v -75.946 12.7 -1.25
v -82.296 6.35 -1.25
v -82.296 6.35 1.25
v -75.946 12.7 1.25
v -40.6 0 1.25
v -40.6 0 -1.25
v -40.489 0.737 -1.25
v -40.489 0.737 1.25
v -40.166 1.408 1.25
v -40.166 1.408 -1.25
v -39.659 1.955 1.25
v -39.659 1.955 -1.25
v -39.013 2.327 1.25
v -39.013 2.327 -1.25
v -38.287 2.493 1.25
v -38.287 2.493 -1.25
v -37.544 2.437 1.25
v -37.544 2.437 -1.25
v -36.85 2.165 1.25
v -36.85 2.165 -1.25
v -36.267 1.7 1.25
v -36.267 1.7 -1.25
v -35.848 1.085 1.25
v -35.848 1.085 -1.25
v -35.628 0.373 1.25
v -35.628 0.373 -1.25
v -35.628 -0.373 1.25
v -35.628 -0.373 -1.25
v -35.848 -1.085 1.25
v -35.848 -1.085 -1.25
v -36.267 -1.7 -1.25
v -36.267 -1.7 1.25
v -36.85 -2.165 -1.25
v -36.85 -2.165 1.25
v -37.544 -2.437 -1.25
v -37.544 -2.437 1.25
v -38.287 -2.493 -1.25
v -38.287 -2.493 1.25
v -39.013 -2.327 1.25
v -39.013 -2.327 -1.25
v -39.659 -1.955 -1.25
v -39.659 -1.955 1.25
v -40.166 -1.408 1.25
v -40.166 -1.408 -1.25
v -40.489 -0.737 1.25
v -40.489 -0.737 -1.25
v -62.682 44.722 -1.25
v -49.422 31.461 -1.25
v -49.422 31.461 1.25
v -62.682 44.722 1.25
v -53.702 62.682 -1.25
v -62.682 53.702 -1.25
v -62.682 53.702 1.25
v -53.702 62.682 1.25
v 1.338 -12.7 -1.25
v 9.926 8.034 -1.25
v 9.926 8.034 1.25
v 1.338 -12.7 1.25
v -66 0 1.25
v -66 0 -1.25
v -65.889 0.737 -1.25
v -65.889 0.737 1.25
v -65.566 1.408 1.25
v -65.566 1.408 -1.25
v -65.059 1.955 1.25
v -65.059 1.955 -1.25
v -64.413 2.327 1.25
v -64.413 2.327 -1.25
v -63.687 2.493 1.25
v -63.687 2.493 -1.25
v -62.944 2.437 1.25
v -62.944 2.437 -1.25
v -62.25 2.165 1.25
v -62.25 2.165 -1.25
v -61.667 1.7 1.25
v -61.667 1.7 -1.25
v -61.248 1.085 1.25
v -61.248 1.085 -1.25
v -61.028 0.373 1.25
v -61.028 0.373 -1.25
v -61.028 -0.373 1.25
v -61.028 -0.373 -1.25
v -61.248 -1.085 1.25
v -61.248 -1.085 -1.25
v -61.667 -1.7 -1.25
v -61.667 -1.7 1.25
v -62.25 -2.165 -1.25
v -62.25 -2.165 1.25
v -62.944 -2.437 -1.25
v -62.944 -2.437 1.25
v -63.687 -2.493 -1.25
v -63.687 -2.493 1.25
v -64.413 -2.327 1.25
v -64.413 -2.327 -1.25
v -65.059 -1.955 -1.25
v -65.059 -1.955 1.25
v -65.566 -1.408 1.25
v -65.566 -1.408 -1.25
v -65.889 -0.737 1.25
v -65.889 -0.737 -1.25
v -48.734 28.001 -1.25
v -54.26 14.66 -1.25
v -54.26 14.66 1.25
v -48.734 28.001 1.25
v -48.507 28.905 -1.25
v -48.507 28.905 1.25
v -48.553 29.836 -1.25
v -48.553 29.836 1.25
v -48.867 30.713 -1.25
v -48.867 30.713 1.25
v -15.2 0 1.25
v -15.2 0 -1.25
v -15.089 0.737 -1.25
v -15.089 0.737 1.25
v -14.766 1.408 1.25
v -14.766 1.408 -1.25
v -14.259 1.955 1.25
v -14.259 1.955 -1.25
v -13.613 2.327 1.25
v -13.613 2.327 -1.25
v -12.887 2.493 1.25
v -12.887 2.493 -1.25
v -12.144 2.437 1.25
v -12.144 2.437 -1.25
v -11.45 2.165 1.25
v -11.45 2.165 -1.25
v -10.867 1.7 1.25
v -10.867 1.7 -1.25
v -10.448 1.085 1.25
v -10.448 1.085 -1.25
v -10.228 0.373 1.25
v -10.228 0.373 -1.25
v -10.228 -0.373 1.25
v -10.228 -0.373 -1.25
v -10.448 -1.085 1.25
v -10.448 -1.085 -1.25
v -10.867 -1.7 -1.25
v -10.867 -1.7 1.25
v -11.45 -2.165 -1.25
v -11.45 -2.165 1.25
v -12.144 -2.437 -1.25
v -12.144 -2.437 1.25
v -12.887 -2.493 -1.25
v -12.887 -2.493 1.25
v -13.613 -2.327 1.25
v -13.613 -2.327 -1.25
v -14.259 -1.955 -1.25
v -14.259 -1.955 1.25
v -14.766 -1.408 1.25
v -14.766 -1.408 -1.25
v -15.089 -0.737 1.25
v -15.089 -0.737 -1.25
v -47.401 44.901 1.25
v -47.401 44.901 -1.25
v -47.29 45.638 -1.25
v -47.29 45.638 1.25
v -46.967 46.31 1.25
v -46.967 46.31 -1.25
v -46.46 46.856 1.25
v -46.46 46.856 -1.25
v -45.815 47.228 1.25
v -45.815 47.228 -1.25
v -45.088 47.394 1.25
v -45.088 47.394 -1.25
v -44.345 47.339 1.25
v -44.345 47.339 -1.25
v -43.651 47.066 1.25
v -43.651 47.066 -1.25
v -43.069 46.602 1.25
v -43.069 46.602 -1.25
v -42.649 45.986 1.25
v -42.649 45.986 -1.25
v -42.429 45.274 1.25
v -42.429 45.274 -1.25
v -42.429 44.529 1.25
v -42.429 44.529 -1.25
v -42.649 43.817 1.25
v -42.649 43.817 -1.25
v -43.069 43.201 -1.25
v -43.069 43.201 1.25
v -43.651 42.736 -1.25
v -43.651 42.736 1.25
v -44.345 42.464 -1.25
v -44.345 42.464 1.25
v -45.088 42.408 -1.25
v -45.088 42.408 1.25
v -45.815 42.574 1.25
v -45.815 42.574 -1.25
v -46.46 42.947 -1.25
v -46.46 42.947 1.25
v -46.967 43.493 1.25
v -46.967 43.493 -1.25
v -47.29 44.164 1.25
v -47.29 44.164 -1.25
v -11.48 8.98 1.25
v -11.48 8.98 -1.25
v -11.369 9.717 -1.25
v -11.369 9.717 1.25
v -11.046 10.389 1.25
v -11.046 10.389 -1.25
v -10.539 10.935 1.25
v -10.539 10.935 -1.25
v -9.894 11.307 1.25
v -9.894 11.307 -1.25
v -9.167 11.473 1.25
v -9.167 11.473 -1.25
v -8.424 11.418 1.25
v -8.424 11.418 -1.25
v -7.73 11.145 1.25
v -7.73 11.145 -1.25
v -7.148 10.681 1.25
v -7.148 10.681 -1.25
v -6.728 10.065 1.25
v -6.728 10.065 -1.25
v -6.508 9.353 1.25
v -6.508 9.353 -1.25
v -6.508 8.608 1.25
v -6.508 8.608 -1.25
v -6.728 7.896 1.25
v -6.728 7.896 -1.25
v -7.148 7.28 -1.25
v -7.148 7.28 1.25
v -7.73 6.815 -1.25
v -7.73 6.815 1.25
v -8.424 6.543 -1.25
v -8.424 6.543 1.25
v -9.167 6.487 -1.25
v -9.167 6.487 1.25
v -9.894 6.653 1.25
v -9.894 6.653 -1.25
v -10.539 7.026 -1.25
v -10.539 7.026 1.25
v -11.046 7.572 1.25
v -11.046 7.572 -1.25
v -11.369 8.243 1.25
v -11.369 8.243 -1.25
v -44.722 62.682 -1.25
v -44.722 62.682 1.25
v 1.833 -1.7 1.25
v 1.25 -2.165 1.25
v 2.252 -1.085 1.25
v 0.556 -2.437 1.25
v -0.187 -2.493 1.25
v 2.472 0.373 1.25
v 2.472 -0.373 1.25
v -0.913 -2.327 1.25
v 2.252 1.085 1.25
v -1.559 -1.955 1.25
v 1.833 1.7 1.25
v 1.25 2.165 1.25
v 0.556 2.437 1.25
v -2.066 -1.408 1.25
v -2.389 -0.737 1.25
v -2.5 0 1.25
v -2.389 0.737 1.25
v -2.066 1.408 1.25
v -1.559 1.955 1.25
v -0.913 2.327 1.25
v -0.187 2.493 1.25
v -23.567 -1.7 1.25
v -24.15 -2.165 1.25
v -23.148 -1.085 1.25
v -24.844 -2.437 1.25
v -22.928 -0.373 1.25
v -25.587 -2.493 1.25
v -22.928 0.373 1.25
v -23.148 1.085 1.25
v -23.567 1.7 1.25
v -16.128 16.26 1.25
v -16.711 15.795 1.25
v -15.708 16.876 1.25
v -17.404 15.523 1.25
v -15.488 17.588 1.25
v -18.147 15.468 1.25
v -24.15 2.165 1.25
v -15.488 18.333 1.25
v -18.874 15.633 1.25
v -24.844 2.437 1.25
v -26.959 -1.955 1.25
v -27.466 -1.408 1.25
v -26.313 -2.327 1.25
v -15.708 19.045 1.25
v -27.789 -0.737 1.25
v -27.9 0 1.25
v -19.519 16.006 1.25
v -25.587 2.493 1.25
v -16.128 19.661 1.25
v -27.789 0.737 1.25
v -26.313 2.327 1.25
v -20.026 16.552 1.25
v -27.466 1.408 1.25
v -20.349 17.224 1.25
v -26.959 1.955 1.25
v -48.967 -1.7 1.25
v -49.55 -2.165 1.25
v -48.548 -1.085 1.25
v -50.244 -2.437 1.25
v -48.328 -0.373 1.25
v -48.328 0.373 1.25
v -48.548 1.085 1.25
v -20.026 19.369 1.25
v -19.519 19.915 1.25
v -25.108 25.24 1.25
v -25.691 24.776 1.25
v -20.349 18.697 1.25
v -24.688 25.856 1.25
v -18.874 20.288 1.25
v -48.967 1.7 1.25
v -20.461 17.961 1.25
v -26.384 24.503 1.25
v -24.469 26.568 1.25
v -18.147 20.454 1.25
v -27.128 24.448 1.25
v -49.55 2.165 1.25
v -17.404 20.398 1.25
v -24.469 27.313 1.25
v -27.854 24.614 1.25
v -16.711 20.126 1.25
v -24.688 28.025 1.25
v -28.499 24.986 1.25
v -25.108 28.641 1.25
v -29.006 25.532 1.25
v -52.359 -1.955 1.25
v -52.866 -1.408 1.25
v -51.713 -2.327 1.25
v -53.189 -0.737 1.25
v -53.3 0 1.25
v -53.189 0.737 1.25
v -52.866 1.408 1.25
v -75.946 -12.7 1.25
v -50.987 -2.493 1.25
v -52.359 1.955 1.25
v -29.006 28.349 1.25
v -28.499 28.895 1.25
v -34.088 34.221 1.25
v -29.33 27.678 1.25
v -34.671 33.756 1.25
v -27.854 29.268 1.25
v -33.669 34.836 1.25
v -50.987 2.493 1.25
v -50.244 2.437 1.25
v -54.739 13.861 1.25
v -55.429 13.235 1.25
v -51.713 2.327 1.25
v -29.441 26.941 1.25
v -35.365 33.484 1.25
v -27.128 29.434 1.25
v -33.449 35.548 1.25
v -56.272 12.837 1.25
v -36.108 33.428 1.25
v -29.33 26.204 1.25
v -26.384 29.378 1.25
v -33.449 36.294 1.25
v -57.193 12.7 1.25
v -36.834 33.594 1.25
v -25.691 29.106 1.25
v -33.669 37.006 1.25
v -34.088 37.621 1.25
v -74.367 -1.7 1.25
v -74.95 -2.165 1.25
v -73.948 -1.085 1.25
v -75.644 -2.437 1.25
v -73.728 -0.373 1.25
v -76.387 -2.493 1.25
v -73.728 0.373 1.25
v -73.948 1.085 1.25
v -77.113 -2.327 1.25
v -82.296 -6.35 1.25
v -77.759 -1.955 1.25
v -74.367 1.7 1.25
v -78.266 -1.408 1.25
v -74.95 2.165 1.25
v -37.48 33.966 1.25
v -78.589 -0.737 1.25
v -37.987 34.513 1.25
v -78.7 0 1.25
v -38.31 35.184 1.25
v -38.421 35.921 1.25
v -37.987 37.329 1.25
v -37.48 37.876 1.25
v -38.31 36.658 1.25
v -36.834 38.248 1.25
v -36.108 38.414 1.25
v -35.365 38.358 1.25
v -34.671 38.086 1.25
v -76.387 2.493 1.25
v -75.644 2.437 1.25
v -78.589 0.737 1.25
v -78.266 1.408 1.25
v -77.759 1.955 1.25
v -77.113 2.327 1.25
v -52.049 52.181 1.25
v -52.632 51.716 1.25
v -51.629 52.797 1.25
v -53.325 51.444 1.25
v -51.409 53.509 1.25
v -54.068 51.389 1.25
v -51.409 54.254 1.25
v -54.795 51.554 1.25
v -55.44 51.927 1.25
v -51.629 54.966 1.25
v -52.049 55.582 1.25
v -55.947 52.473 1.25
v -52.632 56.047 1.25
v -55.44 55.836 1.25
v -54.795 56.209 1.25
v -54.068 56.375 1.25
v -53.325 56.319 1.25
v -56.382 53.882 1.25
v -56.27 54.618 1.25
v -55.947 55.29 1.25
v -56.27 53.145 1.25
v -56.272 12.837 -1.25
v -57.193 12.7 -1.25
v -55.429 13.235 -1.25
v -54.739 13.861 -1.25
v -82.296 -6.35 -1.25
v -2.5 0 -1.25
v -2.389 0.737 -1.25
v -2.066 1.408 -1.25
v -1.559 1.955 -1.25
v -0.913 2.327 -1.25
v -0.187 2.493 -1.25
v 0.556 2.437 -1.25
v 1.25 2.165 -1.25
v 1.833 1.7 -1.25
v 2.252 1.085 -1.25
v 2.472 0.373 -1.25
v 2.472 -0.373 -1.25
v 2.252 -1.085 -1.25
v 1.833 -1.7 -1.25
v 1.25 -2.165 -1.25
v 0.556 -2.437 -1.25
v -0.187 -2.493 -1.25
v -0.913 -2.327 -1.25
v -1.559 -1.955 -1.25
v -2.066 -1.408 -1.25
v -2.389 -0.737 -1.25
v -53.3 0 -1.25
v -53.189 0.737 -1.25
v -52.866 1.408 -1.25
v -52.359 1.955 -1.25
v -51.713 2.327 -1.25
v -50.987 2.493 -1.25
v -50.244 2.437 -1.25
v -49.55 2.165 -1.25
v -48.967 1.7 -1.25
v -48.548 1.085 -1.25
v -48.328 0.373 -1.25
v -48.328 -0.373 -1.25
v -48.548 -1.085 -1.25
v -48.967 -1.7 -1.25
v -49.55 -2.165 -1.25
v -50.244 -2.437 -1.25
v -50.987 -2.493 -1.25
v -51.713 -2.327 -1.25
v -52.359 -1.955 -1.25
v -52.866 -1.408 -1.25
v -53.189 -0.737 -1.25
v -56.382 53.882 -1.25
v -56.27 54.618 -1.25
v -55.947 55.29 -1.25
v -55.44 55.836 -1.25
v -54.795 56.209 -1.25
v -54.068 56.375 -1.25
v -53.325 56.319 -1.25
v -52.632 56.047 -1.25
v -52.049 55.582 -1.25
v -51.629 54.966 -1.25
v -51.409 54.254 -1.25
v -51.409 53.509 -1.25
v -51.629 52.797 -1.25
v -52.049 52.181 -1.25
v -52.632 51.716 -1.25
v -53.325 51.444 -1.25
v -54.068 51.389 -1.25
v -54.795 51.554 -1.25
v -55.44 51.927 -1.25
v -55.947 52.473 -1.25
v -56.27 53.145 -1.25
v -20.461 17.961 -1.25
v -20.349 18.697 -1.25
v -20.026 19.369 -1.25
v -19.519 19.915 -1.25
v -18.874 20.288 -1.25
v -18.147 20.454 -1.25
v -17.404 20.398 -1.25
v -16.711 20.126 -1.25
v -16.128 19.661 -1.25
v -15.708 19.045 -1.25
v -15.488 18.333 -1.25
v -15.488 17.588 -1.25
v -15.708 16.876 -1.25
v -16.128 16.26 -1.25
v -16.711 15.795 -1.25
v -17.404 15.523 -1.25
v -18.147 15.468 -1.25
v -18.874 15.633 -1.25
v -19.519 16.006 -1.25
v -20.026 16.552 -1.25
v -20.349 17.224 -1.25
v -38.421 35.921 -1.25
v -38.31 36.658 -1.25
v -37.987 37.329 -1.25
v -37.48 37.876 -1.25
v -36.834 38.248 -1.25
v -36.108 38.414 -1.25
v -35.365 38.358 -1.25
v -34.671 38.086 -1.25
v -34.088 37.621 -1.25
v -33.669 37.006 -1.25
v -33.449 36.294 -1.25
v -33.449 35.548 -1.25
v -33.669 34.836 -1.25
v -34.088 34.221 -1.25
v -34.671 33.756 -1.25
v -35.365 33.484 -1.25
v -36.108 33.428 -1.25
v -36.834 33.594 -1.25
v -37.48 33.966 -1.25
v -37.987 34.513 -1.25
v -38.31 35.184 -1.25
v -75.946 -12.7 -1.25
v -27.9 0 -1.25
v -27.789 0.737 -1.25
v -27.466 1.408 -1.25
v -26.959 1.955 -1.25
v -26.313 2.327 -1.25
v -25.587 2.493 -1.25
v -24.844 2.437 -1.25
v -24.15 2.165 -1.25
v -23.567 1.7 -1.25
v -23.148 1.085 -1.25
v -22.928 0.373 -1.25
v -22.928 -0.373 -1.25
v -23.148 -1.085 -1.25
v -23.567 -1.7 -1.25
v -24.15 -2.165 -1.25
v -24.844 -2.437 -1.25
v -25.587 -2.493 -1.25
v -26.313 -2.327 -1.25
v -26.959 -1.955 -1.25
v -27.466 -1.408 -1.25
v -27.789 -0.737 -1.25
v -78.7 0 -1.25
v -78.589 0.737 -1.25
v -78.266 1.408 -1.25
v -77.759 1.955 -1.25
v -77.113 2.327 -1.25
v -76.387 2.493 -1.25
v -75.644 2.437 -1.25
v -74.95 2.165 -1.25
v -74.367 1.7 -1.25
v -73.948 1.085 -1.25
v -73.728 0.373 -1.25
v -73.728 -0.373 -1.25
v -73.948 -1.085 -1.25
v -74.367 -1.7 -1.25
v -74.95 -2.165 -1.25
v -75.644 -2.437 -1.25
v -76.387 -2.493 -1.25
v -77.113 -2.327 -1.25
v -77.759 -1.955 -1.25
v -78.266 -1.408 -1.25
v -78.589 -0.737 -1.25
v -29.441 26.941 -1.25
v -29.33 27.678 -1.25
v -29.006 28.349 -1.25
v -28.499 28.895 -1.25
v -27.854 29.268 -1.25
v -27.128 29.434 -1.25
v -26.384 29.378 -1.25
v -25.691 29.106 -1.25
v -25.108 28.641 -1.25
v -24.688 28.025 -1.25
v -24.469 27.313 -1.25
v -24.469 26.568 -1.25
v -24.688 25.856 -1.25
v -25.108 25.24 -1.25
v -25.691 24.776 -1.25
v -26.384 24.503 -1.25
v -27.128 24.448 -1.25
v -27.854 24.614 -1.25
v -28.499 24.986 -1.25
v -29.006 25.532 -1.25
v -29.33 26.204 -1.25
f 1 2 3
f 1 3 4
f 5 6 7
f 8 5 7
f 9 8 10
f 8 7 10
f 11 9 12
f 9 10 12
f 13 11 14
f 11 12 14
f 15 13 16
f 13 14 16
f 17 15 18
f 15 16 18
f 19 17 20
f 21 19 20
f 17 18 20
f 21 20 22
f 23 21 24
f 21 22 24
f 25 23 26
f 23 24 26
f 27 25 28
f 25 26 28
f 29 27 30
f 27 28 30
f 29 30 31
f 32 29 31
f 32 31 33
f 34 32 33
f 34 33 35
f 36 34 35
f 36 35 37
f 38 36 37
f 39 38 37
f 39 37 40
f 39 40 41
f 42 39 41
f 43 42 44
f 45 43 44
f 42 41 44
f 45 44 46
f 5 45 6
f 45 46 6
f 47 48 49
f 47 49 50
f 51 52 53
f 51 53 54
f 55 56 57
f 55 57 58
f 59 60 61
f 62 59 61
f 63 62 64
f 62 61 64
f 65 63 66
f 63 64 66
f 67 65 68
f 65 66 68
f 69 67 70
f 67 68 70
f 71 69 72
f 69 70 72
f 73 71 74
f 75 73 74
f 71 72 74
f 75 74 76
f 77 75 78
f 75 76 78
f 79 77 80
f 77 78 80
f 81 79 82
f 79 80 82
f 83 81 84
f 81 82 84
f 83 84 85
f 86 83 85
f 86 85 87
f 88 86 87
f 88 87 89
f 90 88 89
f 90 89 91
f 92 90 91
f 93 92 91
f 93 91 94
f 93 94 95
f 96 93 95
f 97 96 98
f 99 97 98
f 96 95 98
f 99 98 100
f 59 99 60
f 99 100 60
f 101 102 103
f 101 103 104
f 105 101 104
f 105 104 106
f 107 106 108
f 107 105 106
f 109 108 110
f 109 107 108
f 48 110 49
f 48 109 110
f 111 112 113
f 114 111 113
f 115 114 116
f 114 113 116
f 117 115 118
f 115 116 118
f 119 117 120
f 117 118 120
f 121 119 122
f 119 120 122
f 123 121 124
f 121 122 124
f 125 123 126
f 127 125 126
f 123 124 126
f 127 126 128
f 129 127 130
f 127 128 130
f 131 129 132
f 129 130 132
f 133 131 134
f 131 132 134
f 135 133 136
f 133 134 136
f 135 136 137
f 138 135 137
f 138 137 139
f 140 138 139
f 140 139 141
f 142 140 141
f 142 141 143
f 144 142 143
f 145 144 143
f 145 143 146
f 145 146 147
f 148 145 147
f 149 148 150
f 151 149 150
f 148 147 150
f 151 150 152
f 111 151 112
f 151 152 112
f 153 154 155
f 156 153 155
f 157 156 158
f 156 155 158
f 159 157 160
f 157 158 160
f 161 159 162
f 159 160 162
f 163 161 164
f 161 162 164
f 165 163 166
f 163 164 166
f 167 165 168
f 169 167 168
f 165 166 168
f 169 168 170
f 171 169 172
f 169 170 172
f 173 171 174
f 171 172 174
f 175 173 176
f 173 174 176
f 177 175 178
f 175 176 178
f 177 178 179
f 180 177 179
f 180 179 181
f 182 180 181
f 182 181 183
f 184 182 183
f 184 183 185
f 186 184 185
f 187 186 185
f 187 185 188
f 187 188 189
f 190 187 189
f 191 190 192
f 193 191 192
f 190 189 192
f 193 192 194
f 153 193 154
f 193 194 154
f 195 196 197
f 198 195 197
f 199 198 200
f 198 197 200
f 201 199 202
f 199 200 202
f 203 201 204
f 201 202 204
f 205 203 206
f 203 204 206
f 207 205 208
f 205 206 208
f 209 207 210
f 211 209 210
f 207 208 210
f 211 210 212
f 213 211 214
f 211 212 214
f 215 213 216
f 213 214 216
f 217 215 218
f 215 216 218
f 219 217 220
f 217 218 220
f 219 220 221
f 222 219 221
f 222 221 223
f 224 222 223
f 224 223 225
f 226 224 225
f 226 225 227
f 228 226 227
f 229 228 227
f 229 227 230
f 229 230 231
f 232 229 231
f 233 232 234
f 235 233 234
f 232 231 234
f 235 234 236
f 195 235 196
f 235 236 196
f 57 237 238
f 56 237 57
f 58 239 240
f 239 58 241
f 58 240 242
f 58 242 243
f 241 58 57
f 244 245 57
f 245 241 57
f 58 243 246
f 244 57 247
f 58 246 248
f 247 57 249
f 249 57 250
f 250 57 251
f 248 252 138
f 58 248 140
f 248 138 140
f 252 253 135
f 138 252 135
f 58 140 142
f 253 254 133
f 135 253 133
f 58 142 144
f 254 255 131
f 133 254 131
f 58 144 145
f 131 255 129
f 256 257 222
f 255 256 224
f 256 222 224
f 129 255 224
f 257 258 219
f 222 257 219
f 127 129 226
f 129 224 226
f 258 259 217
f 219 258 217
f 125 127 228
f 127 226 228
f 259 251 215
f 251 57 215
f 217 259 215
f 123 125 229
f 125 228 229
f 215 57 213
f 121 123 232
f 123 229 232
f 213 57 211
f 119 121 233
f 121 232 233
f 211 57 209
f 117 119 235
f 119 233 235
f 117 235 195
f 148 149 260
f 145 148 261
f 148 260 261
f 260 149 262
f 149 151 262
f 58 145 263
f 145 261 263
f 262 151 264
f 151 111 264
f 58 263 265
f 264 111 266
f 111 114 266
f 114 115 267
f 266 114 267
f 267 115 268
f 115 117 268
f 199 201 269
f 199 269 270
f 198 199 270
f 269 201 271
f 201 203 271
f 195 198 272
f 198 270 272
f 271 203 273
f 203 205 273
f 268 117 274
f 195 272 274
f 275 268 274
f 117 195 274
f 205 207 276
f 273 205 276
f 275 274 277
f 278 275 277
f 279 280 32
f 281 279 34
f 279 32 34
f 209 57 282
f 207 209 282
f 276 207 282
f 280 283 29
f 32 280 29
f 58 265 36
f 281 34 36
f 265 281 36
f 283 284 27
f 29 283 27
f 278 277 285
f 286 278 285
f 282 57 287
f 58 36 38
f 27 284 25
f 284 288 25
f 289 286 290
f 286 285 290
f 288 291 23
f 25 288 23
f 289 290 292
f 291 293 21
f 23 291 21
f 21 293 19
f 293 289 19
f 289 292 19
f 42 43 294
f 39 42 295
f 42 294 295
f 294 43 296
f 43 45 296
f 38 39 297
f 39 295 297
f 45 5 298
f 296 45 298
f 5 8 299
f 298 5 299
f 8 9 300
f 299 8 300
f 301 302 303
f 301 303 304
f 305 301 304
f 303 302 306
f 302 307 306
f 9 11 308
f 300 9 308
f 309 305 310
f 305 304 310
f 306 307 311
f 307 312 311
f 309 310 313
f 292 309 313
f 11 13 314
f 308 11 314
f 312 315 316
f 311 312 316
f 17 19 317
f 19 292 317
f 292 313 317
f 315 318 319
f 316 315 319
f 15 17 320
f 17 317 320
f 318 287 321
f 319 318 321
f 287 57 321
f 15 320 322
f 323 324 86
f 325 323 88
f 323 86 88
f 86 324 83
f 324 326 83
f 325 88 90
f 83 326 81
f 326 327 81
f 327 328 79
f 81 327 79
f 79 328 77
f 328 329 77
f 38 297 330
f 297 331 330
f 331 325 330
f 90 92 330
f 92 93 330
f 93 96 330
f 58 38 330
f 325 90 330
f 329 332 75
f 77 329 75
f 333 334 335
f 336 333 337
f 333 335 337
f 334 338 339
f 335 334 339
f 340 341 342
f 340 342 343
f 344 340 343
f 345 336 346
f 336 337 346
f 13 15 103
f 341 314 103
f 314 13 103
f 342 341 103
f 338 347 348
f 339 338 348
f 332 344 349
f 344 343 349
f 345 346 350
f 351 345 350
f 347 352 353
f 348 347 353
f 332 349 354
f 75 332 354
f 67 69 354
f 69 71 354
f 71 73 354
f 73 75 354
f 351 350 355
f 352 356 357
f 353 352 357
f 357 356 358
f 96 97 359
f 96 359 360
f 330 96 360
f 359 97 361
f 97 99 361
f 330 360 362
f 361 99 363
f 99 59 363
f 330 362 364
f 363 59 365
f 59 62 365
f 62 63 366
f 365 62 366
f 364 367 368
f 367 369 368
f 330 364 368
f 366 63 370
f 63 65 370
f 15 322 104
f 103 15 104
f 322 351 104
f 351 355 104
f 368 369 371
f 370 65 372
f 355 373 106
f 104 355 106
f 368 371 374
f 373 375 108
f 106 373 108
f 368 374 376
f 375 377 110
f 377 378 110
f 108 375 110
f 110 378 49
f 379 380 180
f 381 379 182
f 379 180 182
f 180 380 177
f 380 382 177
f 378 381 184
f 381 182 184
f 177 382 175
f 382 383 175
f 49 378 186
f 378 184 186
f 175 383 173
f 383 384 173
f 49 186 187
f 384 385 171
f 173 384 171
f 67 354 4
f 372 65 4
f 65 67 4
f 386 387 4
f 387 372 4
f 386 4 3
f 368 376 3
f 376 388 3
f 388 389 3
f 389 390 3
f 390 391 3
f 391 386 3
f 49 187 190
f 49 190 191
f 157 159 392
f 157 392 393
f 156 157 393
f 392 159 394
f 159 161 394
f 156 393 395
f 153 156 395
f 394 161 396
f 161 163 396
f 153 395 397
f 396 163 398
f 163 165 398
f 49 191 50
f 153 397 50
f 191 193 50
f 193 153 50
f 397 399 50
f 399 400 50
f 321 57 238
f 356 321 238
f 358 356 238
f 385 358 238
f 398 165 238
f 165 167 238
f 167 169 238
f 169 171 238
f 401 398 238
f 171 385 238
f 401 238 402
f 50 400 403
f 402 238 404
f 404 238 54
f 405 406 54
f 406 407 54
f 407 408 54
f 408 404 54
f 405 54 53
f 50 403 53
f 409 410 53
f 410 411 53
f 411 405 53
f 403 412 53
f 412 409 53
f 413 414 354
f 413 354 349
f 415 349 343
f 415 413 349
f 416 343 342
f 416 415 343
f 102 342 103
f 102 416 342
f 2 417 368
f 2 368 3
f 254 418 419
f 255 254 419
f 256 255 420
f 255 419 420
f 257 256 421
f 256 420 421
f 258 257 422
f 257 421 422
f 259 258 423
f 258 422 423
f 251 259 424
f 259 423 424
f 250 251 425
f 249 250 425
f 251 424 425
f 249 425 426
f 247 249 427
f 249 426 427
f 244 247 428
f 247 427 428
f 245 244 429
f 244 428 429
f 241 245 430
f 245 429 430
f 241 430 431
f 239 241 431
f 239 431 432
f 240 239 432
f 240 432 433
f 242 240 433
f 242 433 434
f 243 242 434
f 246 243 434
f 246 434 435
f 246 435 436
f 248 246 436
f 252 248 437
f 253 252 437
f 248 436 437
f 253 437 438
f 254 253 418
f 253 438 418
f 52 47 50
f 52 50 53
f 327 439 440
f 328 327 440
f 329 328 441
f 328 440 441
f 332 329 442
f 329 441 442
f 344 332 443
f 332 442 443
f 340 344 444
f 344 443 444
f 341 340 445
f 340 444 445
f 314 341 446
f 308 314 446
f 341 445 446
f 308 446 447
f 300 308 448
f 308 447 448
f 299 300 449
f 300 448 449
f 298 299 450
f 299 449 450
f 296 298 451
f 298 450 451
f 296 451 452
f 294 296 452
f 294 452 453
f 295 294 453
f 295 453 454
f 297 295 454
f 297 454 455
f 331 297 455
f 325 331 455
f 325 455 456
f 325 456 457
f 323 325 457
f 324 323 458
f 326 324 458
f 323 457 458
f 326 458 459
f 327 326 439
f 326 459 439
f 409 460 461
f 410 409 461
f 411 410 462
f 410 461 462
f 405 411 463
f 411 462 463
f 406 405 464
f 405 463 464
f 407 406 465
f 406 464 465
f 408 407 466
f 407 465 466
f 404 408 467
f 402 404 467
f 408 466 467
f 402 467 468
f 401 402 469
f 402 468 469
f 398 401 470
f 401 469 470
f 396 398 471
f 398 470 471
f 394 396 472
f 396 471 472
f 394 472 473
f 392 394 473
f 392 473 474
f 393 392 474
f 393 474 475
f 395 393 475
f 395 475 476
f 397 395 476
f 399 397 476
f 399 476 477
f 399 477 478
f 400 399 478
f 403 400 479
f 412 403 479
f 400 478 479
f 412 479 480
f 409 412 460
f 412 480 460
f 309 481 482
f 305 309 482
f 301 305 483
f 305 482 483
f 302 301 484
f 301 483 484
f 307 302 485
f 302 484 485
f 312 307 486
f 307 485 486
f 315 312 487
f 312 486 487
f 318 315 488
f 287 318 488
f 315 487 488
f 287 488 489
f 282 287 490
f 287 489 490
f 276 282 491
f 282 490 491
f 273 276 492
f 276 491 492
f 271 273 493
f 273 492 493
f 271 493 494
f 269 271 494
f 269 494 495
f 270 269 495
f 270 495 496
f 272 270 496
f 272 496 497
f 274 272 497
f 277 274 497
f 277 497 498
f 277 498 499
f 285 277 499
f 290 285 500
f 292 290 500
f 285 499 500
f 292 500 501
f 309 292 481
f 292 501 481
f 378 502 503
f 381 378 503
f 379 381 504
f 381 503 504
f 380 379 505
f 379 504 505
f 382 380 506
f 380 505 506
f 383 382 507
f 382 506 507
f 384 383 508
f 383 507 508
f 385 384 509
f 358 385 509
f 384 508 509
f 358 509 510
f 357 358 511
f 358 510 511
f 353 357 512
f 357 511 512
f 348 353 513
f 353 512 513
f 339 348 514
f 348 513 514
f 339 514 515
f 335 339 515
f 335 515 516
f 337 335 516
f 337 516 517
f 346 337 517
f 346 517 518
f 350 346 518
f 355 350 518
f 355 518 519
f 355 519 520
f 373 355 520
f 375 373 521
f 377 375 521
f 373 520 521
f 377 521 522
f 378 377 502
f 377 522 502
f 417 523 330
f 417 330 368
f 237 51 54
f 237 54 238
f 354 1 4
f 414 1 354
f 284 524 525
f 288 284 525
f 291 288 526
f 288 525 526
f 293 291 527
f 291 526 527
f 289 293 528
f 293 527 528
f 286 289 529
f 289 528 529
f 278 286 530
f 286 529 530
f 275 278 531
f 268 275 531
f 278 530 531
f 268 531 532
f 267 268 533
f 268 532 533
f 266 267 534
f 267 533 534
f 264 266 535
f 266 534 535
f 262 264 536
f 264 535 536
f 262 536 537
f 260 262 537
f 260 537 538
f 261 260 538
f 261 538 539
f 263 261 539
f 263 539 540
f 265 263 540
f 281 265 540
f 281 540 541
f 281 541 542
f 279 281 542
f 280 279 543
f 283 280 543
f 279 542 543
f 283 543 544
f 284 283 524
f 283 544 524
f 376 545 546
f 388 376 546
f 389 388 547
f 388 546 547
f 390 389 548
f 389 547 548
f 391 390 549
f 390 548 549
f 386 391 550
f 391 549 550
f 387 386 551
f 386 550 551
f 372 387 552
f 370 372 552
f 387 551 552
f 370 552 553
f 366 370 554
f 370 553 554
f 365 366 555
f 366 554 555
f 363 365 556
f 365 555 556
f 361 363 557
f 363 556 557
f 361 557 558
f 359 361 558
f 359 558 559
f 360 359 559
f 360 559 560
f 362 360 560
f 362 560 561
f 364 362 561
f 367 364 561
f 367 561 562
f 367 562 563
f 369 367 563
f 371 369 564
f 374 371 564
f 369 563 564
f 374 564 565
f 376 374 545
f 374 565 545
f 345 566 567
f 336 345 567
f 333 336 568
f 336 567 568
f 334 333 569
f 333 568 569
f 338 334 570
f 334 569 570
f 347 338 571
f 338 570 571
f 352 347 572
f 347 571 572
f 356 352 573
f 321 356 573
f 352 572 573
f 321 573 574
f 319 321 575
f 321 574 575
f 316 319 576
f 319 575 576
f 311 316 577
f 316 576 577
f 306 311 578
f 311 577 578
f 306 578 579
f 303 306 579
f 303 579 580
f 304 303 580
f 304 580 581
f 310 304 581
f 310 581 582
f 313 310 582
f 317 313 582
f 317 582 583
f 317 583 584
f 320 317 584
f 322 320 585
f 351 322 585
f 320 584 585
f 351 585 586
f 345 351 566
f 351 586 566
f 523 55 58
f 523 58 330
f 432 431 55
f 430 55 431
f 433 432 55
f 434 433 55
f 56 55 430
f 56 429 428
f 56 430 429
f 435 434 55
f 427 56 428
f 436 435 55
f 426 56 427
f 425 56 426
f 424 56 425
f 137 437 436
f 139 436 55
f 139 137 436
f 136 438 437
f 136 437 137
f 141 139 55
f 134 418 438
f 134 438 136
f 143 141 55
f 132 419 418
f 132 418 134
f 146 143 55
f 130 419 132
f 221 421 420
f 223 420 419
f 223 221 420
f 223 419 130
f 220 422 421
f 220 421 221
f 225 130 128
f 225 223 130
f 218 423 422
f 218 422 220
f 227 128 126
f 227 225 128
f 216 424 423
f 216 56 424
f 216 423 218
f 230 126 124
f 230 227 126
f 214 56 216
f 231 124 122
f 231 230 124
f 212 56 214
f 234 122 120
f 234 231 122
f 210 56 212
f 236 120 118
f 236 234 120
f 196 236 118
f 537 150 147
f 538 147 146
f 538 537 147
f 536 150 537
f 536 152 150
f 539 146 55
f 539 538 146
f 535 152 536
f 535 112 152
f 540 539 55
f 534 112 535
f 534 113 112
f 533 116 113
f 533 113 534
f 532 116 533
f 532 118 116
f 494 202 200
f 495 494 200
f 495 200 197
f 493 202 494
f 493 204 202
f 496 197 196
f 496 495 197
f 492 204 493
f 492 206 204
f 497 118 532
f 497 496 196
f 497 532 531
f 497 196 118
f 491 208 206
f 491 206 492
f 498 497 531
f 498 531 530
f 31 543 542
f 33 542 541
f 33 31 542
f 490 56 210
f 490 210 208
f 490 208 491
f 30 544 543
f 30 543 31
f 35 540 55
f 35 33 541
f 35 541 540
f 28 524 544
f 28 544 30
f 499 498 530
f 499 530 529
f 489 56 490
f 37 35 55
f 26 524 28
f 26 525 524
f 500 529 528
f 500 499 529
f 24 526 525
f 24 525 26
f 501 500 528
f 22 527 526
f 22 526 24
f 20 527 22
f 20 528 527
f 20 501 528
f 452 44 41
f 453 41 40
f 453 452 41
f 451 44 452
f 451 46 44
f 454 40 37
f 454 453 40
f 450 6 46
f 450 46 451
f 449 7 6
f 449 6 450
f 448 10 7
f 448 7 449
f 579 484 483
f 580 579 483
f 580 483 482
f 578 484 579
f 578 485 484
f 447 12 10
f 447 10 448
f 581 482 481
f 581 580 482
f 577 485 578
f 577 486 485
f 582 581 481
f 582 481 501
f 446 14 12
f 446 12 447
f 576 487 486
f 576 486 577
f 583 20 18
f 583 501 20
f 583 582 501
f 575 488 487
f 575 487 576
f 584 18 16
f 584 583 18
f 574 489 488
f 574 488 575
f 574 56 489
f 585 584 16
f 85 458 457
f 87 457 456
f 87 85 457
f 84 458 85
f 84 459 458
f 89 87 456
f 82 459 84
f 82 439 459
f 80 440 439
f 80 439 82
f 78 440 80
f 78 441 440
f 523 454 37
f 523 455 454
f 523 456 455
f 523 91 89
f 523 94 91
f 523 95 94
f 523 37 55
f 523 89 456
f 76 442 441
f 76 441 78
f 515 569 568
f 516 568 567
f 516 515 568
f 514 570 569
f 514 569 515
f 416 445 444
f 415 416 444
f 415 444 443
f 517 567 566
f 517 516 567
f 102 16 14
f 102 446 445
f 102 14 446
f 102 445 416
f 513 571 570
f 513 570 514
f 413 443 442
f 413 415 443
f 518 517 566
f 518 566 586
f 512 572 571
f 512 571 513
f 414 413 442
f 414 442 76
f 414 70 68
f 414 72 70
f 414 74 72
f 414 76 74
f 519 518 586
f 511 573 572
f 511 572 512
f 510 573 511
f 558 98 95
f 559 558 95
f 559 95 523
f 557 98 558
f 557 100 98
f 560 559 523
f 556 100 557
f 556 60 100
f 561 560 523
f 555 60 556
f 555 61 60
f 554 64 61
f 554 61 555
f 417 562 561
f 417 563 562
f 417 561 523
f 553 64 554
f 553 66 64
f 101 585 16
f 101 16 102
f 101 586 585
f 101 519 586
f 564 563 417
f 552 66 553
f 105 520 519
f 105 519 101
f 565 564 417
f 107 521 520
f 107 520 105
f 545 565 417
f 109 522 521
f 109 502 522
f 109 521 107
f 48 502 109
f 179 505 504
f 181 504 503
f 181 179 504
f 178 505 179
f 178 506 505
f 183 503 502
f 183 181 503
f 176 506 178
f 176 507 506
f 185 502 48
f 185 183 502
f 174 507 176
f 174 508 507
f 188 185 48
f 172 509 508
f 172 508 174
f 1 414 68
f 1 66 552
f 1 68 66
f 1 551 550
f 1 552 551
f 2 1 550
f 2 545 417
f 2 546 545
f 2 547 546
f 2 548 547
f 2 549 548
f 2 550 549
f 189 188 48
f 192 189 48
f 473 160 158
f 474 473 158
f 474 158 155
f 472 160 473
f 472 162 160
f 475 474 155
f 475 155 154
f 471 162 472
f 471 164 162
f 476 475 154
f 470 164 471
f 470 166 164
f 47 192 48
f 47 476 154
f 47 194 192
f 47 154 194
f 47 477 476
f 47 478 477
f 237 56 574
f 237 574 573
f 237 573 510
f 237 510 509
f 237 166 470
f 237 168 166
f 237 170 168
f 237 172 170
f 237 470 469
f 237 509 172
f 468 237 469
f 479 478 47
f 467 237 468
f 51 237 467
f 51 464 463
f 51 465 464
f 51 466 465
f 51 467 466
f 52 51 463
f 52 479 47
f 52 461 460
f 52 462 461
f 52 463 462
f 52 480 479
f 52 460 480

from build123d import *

# Parameters (mm, degrees)
SKETCH1_R           = 2.5
BOSS_EXTRUDE1_DEPTH = 2.5


with BuildPart() as part:
    # Sketch1 → Boss-Extrude1 (new body)
    with BuildSketch(Plane(origin=(0, 0, -1.25), x_dir=(-1, 0, 0), z_dir=(0, 0, -1))):
        with BuildLine():
            Line((-1.337750611, -12.7), (75.946, -12.7))
            Line((75.946, -12.7), (82.296, -6.35))
            Line((82.296, -6.35), (82.296, 6.35))
            Line((82.296, 6.35), (75.946, 12.7))
            Line((75.946, 12.7), (57.193204579, 12.7))
            ThreePointArc((57.193204579, 12.7), (55.429269089, 13.235083981), (54.259887063, 14.659980102))
            Line((54.259887063, 14.659980102), (48.733705431, 28.001362746))
            ThreePointArc((48.733705431, 28.001362746), (48.553029681, 29.835794416), (49.421958916, 31.461446674))
            Line((49.421958916, 31.461446674), (62.682187725, 44.721675483))
            Line((62.682187725, 44.721675483), (62.682187725, 53.701931604))
            Line((62.682187725, 53.701931604), (53.701931604, 62.682187725))
            Line((53.701931604, 62.682187725), (44.721675483, 62.682187725))
            Line((44.721675483, 62.682187725), (-9.92618865, 8.034323593))
            Line((-9.92618865, 8.034323593), (-1.337750611, -12.7))
        make_face()
        with Locations((12.7, 0)):
            Circle(SKETCH1_R, mode=Mode.SUBTRACT)
        with Locations((25.4, 0)):
            Circle(SKETCH1_R, mode=Mode.SUBTRACT)
        with Locations((38.1, 0)):
            Circle(SKETCH1_R, mode=Mode.SUBTRACT)
        with Locations((50.8, 0)):
            Circle(SKETCH1_R, mode=Mode.SUBTRACT)
        Circle(SKETCH1_R, mode=Mode.SUBTRACT)
        with Locations((76.2, 0)):
            Circle(SKETCH1_R, mode=Mode.SUBTRACT)
        with Locations((63.5, 0)):
            Circle(SKETCH1_R, mode=Mode.SUBTRACT)
        with Locations((53.881536726, 53.881536726)):
            Circle(SKETCH1_R, mode=Mode.SUBTRACT)
        with Locations((44.901280605, 44.901280605)):
            Circle(SKETCH1_R, mode=Mode.SUBTRACT)
        with Locations((35.921024484, 35.921024484)):
            Circle(SKETCH1_R, mode=Mode.SUBTRACT)
        with Locations((26.940768363, 26.940768363)):
            Circle(SKETCH1_R, mode=Mode.SUBTRACT)
        with Locations((17.960512242, 17.960512242)):
            Circle(SKETCH1_R, mode=Mode.SUBTRACT)
        with Locations((8.980256121, 8.980256121)):
            Circle(SKETCH1_R, mode=Mode.SUBTRACT)
    extrude(amount=-BOSS_EXTRUDE1_DEPTH)


solid = part.part
